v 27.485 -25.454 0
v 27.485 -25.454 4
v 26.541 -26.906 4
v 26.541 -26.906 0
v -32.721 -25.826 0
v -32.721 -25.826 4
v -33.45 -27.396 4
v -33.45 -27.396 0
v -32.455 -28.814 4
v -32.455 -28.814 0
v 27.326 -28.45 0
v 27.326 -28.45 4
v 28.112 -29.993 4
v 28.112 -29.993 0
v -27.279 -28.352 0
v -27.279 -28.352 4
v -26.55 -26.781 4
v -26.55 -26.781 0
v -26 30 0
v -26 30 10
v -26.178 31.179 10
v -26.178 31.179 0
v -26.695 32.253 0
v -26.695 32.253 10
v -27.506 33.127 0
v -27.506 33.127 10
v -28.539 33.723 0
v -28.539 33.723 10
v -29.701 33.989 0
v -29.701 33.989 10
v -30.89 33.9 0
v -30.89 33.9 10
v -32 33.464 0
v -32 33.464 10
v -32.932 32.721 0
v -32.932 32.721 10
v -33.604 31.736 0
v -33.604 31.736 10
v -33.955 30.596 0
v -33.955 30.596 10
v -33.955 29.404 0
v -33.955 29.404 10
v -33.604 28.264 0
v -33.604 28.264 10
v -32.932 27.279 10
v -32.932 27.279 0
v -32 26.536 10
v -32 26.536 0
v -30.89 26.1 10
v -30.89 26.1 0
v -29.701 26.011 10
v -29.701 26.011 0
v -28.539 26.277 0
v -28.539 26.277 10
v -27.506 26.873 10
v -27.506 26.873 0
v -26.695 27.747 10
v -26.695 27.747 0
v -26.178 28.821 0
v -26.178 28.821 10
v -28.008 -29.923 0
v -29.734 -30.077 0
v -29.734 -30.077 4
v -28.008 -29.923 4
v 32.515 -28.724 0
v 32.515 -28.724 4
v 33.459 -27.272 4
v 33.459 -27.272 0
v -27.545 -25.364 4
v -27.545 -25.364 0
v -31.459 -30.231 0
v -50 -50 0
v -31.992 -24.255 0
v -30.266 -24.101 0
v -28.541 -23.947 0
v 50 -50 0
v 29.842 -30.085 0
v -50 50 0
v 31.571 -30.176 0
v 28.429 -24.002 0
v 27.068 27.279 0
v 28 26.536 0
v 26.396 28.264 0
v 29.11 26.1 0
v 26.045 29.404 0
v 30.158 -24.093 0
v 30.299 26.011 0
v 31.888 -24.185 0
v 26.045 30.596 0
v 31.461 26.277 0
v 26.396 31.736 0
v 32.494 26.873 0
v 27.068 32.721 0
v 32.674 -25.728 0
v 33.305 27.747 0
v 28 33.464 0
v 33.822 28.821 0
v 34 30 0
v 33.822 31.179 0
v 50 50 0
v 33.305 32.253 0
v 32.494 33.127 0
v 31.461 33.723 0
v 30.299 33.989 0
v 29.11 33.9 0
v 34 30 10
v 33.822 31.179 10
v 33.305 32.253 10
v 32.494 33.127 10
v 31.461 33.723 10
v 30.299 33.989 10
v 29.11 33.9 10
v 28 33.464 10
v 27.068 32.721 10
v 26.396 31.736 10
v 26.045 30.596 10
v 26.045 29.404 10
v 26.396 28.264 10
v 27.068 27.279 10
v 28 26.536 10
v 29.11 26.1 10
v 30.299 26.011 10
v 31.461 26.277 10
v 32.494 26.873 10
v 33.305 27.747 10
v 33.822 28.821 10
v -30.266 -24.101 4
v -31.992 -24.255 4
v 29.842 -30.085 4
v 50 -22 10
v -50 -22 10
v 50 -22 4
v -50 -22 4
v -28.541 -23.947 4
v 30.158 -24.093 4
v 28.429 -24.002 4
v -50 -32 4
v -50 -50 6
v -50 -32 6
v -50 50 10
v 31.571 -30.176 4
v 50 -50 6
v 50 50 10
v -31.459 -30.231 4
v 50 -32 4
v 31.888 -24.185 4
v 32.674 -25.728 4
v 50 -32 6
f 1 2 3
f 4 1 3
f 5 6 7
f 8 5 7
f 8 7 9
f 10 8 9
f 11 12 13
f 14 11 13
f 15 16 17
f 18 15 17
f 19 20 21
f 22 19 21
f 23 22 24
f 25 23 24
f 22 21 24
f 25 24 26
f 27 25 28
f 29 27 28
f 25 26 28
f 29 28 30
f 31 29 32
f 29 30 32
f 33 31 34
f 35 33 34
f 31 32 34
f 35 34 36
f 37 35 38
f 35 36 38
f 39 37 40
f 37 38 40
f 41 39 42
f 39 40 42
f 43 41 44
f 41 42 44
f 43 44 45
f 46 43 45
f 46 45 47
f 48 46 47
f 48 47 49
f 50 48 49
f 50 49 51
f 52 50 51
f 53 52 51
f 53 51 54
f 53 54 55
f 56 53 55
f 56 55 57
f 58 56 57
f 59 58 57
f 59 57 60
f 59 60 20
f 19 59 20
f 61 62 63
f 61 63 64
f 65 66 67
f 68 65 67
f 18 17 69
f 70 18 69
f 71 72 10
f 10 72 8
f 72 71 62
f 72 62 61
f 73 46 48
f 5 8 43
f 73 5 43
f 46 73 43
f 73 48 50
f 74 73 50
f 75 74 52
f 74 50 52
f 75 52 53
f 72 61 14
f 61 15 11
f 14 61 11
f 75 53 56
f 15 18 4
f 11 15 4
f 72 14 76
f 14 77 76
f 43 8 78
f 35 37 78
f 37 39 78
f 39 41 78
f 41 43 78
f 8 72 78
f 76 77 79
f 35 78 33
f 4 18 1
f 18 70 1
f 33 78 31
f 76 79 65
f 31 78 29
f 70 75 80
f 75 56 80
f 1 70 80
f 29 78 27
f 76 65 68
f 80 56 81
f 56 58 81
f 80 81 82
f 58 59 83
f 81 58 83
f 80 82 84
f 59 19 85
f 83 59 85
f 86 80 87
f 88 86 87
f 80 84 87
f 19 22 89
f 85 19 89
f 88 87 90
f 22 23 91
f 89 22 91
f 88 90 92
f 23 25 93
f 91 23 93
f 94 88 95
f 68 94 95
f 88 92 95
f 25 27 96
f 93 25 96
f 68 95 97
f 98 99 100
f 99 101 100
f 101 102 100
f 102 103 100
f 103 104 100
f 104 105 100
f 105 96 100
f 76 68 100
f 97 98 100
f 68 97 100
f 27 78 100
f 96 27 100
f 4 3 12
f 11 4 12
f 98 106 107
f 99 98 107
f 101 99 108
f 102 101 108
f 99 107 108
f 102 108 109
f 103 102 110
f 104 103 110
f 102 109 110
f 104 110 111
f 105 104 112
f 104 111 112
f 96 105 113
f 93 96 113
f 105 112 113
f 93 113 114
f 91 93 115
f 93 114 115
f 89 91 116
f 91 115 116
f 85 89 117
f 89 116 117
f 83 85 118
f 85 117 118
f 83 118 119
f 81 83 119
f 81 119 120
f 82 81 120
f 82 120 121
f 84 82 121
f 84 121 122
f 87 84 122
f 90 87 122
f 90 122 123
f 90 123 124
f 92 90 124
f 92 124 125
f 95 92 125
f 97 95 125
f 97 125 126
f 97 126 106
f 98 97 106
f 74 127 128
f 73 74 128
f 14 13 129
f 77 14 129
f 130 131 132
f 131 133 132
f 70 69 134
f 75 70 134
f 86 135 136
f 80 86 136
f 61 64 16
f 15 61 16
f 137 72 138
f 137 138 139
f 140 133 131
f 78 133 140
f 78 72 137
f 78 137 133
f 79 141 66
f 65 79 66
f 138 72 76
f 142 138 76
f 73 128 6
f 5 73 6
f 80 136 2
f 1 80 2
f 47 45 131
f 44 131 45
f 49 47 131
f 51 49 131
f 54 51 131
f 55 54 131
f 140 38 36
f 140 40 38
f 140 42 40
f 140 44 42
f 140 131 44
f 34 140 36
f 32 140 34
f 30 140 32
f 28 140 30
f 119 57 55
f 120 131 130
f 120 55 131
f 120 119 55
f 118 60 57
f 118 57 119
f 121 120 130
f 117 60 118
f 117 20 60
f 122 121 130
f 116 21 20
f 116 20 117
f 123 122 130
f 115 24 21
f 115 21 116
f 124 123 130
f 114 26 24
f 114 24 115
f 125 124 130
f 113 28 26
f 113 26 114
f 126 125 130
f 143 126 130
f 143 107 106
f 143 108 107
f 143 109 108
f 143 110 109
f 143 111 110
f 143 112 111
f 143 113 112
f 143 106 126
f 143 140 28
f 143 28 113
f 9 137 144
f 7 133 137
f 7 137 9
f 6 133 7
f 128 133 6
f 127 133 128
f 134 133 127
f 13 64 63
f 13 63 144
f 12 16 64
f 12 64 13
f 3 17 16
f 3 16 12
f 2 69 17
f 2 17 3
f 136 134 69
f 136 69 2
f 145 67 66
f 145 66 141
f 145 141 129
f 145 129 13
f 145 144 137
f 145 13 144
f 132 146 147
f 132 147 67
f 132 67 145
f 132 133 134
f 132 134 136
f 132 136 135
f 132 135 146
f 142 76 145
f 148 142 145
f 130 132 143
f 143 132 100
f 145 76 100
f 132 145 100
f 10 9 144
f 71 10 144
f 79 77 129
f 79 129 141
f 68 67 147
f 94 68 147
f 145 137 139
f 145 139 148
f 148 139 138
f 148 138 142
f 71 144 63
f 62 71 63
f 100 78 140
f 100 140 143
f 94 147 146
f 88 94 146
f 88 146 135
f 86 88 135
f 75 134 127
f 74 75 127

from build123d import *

# Parameters (mm, degrees)
F0_W     = 100
F0_H     = 100
F1_DEPTH = 4
F2_W     = 100
F2_H     = 72
F2_H_2   = 18
F3_DEPTH = 2
F4_W     = 100
F4_H     = 72
F5_DEPTH = 4
F6_R     = 4
F7_DEPTH = 25


with BuildPart() as f1:
    # F0 (on Top) → F1 (new body)
    with BuildSketch(Plane.XY):
        Rectangle(F0_W, F0_H)
    extrude(amount=F1_DEPTH)

    # F2 (on face) → F3 (join)
    with BuildSketch(Plane.XY.offset(4)):
        with Locations((0, 14)):
            Rectangle(F2_W, F2_H)
        with Locations((0, -41)):
            Rectangle(F2_W, F2_H_2)
    extrude(amount=F3_DEPTH)

    # F4 (on face) → F5 (join)
    with BuildSketch(Plane.XY.offset(6)):
        with Locations((0, 14)):
            Rectangle(F4_W, F4_H)
    extrude(amount=F5_DEPTH)

    # F6 (on face) → F7 (cut)
    with BuildSketch(Plane.XY.offset(10)):
        with Locations((30, 30)):
            Circle(F6_R)
        with Locations((-30, 30)):
            Circle(F6_R)
        with BuildLine():
            ThreePointArc((-27.2789726301, -28.3521687498), (-27.0705732549, -27.7357198631), (-27, -27.0888358355))
            ThreePointArc((-27, -27.0888358355), (-27.1396000204, -26.1843404199), (-27.5454079712, -25.3640233899))
            ThreePointArc((-27.5454079712, -25.3640233899), (-28.7366669855, -24.3678085121), (-30.2664349753, -24.1006905237))
            ThreePointArc((-30.2664349753, -24.1006905237), (-31.7248121898, -24.634243627), (-32.721027317, -25.8255028072))
            ThreePointArc((-32.721027317, -25.8255028072), (-32.9881452887, -27.3552710687), (-32.4545920728, -28.8136482183))
            ThreePointArc((-32.4545920728, -28.8136482183), (-31.2633329265, -29.8098631997), (-29.7335647552, -30.0769811231))
            ThreePointArc((-29.7335647552, -30.0769811231), (-28.2751876481, -29.54342793), (-27.2789726301, -28.3521687498))
        make_face()
        with BuildLine():
            ThreePointArc((-27.5454079712, -25.3640233899), (-27.1396000204, -26.1843404199), (-27, -27.0888358355))
            ThreePointArc((-27, -27.0888358355), (-27.0705732549, -27.7357198631), (-27.2789726301, -28.3521687498))
            Line((-27.2789726301, -28.3521687498), (-26.5495870229, -26.7811829673))
            Line((-26.5495870229, -26.7811829673), (-27.5454079712, -25.3640233899))
        make_face()
        with BuildLine():
            ThreePointArc((-30.2664349753, -24.1006905237), (-28.7366669855, -24.3678085121), (-27.5454079712, -25.3640233899))
            Line((-27.5454079712, -25.3640233899), (-28.5412287108, -23.9468641096))
            Line((-28.5412287108, -23.9468641096), (-30.2664349753, -24.1006905237))
        make_face()
        with BuildLine():
            Line((-28.0083583121, -29.9231546931), (-27.2789726301, -28.3521687498))
            ThreePointArc((-27.2789726301, -28.3521687498), (-28.2751876481, -29.54342793), (-29.7335647552, -30.0769811231))
            Line((-29.7335647552, -30.0769811231), (-28.0083583121, -29.9231546931))
        make_face()
        with BuildLine():
            ThreePointArc((-32.721027317, -25.8255028072), (-31.7248121898, -24.634243627), (-30.2664349753, -24.1006905237))
            Line((-30.2664349753, -24.1006905237), (-31.9916416879, -24.2545169778))
            Line((-31.9916416879, -24.2545169778), (-32.721027317, -25.8255028072))
        make_face()
        with BuildLine():
            Line((-31.4587712892, -30.2308075613), (-29.7335647552, -30.0769811231))
            ThreePointArc((-29.7335647552, -30.0769811231), (-31.2633329265, -29.8098631997), (-32.4545920728, -28.8136482183))
            Line((-32.4545920728, -28.8136482183), (-31.4587712892, -30.2308075613))
        make_face()
        with BuildLine():
            ThreePointArc((-32.4545920728, -28.8136482183), (-32.9881452887, -27.3552710687), (-32.721027317, -25.8255028072))
            Line((-32.721027317, -25.8255028072), (-33.4504129771, -27.3964887036))
            Line((-33.4504129771, -27.3964887036), (-32.4545920728, -28.8136482183))
        make_face()
        with BuildLine():
            ThreePointArc((32.5153308801, -28.7239650037), (32.876281683, -27.9416451078), (33, -27.089))
            ThreePointArc((33, -27.089), (32.9172554923, -26.3892712006), (32.6735864049, -25.7281415445))
            ThreePointArc((32.6735864049, -25.7281415445), (31.6349646218, -24.5736688716), (30.1582554561, -24.0931770395))
            ThreePointArc((30.1582554561, -24.0931770395), (28.6391417683, -24.4154134812), (27.4846689431, -25.4540352683))
            ThreePointArc((27.4846689431, -25.4540352683), (27.0041770385, -26.9307445628), (27.3264135035, -28.4498582753))
            ThreePointArc((27.3264135035, -28.4498582753), (28.365035239, -29.6043310379), (29.8417444141, -30.0848229536))
            ThreePointArc((29.8417444141, -30.0848229536), (31.3608580292, -29.7625866218), (32.5153308801, -28.7239650037))
        make_face()
        with BuildLine():
            ThreePointArc((32.6735864049, -25.7281415445), (32.9172554923, -26.3892712006), (33, -27.089))
            ThreePointArc((33, -27.089), (32.876281683, -27.9416451078), (32.5153308801, -28.7239650037))
            Line((32.5153308801, -28.7239650037), (33.4592783853, -27.2717376616))
            Line((33.4592783853, -27.2717376616), (32.6735864049, -25.7281415445))
        make_face()
        with BuildLine():
            ThreePointArc((30.1582554561, -24.0931770395), (31.6349646218, -24.5736688716), (32.6735864049, -25.7281415445))
            Line((32.6735864049, -25.7281415445), (31.8878946499, -24.1845458704))
            Line((31.8878946499, -24.1845458704), (30.1582554561, -24.0931770395))
        make_face()
        with BuildLine():
            Line((31.5713837355, -30.1761917913), (32.5153308801, -28.7239650037))
            ThreePointArc((32.5153308801, -28.7239650037), (31.3608580292, -29.7625866218), (29.8417444141, -30.0848229536))
            Line((29.8417444141, -30.0848229536), (31.5713837355, -30.1761917913))
        make_face()
        with BuildLine():
            ThreePointArc((27.4846689431, -25.4540352683), (28.6391417683, -24.4154134812), (30.1582554561, -24.0931770395))
            Line((30.1582554561, -24.0931770395), (28.4286162645, -24.0018082087))
            Line((28.4286162645, -24.0018082087), (27.4846689431, -25.4540352683))
        make_face()
        with BuildLine():
            Line((28.1121053501, -29.9934541296), (29.8417444141, -30.0848229536))
            ThreePointArc((29.8417444141, -30.0848229536), (28.365035239, -29.6043310379), (27.3264135035, -28.4498582753))
            Line((27.3264135035, -28.4498582753), (28.1121053501, -29.9934541296))
        make_face()
        with BuildLine():
            ThreePointArc((27.3264135035, -28.4498582753), (27.0041770385, -26.9307445628), (27.4846689431, -25.4540352683))
            Line((27.4846689431, -25.4540352683), (26.5407216147, -26.9062623384))
            Line((26.5407216147, -26.9062623384), (27.3264135035, -28.4498582753))
        make_face()
    extrude(amount=-F7_DEPTH, mode=Mode.SUBTRACT)


solid = f1.part
